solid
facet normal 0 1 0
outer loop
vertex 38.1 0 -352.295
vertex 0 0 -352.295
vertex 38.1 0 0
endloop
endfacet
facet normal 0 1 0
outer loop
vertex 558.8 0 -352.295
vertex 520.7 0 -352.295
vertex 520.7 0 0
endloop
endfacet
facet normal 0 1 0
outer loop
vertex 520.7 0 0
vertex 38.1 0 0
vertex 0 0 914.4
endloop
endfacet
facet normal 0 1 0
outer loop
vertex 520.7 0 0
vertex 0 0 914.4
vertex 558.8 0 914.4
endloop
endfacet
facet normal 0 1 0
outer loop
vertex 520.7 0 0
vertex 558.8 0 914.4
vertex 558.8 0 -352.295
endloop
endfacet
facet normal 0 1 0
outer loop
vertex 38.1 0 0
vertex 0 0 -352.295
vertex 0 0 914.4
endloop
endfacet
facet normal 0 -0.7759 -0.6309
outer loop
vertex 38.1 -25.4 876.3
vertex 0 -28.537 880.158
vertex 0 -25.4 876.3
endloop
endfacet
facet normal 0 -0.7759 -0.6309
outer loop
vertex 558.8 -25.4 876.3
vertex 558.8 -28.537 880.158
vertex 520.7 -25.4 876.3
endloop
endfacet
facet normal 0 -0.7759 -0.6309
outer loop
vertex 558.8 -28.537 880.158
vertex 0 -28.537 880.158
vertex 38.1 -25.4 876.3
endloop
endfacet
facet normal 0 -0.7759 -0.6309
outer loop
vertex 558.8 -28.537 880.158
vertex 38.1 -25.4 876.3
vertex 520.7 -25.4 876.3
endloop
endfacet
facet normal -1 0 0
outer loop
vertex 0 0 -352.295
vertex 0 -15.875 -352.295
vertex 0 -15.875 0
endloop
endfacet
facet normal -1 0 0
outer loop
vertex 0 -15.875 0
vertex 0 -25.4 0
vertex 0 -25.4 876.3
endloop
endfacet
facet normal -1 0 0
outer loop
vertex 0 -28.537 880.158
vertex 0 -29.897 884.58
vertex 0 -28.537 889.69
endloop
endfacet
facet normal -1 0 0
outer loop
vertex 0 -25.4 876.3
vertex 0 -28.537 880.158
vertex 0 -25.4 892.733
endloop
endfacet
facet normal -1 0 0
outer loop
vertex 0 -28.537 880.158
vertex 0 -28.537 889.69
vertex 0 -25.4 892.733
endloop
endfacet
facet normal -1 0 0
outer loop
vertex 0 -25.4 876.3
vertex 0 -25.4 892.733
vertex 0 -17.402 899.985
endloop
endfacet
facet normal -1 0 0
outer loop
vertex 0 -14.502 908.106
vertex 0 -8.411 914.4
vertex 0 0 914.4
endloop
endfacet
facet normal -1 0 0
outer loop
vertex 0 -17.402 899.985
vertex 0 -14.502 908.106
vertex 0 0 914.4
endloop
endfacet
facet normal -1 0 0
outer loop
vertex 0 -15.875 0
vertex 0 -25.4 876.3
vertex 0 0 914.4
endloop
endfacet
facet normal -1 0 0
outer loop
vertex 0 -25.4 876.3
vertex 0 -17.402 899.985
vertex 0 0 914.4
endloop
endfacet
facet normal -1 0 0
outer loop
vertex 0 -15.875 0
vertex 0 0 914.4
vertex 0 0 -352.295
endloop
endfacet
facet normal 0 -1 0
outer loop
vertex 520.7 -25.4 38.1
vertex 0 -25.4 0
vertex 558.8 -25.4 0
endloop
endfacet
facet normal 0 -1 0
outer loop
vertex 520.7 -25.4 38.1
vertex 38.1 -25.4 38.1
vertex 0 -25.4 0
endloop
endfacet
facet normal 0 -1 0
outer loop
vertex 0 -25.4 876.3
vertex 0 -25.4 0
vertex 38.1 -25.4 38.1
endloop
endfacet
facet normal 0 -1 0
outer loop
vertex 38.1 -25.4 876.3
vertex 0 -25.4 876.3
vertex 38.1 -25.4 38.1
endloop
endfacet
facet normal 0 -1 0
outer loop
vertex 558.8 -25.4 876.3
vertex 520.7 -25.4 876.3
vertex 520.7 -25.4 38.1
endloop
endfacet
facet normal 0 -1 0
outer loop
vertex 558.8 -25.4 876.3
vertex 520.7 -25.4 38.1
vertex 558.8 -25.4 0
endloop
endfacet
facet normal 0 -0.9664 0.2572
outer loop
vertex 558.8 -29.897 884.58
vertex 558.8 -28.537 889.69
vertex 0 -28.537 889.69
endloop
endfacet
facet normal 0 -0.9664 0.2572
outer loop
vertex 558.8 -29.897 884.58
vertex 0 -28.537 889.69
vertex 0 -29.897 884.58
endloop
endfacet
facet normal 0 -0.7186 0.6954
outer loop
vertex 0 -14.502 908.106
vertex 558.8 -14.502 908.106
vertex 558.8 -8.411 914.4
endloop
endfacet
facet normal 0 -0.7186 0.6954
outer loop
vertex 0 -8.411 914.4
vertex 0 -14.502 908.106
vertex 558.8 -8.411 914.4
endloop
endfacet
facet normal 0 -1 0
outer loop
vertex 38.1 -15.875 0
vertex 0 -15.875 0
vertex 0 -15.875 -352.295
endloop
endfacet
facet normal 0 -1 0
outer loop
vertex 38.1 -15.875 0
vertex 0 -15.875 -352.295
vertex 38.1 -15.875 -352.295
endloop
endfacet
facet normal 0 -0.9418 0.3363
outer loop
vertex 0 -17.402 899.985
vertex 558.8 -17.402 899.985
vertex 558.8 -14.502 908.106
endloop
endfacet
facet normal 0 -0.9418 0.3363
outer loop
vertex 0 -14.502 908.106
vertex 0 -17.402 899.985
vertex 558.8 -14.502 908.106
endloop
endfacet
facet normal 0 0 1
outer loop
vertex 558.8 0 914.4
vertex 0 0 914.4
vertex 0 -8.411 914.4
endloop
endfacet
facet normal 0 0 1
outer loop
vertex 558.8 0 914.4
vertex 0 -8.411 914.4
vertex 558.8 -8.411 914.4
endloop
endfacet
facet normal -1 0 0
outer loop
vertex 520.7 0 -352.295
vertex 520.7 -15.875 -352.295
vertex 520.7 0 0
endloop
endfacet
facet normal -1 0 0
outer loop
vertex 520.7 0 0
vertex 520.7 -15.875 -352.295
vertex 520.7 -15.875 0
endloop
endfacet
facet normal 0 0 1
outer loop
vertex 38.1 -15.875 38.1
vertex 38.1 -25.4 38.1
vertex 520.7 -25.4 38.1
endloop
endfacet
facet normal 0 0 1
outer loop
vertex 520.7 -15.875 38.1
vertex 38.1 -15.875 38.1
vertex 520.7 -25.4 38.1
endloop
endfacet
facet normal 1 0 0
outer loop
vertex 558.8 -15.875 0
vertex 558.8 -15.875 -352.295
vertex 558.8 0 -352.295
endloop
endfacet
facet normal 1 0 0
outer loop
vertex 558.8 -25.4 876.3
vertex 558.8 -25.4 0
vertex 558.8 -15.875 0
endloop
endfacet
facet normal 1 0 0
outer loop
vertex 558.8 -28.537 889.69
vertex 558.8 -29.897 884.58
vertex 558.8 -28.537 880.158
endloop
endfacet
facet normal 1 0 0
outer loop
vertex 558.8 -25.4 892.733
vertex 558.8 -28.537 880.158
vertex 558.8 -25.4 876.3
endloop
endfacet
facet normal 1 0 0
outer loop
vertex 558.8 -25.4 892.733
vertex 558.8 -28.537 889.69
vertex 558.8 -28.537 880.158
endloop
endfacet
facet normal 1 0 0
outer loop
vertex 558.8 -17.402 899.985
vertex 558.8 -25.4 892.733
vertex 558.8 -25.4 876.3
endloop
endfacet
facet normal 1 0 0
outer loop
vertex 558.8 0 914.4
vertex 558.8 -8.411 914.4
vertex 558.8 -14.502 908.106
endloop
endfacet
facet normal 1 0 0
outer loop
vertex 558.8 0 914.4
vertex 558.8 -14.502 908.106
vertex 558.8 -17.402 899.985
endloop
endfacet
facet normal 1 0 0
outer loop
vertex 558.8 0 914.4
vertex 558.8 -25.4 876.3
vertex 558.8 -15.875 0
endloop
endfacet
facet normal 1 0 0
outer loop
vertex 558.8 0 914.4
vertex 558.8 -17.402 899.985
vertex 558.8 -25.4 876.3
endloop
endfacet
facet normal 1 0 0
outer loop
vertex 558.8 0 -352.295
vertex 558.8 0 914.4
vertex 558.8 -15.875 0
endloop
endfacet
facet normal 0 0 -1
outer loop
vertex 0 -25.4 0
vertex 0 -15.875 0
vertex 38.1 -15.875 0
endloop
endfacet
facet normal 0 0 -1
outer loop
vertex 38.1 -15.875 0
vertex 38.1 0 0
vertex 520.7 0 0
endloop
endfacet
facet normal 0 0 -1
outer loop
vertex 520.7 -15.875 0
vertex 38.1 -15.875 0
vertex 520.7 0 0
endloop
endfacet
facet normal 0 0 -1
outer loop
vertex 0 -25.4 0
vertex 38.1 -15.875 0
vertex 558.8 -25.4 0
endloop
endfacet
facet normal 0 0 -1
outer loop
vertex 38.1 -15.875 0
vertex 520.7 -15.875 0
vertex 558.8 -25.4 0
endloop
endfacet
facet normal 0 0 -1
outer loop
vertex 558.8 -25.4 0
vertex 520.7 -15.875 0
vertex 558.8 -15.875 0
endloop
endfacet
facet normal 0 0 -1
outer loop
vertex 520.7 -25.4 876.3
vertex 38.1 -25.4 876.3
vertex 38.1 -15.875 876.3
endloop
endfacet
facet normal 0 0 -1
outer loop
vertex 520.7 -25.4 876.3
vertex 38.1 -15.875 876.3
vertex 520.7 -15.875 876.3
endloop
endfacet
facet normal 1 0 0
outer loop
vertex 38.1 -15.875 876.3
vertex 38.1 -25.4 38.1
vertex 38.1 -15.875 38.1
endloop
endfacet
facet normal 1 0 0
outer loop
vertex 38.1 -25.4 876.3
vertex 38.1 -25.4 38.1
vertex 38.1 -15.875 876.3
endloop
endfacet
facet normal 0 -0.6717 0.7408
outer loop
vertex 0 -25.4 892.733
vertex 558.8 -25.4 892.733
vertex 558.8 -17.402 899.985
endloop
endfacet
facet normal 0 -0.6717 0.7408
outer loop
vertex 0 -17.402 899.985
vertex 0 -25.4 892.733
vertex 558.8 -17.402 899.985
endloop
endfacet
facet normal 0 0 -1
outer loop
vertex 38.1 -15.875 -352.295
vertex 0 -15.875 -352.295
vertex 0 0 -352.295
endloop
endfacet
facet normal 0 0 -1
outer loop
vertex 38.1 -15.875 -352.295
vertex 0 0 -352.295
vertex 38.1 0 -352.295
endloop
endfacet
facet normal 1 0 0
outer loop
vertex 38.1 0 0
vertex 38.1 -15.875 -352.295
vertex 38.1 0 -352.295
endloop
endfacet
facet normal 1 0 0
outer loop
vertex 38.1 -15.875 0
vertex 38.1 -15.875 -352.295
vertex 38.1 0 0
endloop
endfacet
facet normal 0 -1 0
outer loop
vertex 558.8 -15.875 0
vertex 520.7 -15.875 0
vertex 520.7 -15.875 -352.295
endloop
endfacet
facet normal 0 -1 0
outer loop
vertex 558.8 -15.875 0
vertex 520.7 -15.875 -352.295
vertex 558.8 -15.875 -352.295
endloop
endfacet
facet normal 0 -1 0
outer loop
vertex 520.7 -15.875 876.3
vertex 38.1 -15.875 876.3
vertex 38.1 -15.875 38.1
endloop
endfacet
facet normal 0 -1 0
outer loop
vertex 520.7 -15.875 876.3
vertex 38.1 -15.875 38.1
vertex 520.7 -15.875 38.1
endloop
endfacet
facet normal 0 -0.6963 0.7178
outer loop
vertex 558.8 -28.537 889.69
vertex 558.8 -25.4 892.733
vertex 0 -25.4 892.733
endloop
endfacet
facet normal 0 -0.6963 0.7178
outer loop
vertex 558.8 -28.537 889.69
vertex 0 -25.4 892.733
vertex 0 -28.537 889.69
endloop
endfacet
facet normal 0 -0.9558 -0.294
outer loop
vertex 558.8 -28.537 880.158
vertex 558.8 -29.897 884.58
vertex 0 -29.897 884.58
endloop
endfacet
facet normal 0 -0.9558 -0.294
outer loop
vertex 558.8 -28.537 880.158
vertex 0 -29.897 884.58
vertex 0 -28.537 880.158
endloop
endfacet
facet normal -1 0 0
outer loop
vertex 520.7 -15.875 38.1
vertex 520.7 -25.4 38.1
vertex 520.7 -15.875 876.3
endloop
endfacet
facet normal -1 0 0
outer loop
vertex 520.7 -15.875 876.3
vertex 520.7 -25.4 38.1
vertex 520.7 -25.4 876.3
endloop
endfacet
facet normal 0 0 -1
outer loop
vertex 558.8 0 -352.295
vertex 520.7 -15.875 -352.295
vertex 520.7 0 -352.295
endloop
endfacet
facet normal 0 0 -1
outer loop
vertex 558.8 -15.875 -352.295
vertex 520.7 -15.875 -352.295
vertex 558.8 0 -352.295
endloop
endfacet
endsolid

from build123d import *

# Parameters (mm, degrees)
F0_W     = 558.8
F0_H     = 914.4
F1_DEPTH = 25.4
F2_W     = 482.6
F2_H     = 838.2
F3_DEPTH = 9.525
F4_W     = 38.1
F4_H     = 390.394981
F5_DEPTH = 15.875
F7_DEPTH = 558.801
F9_DEPTH = 558.8


with BuildPart() as f1:
    # F0 (on Front) → F1 (new body)
    with BuildSketch(Plane.XZ):
        with Locations((279.4, 457.2)):
            Rectangle(F0_W, F0_H)
    extrude(amount=F1_DEPTH)

    # F2 (on face) → F3 (cut)
    with BuildSketch(Plane.XZ.offset(25.4)):
        with Locations((279.4, 457.2)):
            Rectangle(F2_W, F2_H)
    extrude(amount=-F3_DEPTH, mode=Mode.SUBTRACT)

    # F4 (on face) → F5 (join, through all)
    with BuildSketch(Plane.XZ.offset(15.875)):
        with Locations((19.05, -157.09749)):
            Rectangle(F4_W, F4_H)
        with Locations((539.75, -157.09749)):
            Rectangle(F4_W, F4_H)
    extrude(amount=-F5_DEPTH)

    # F6 (on face) → F7 (cut, through all)
    with BuildSketch(Plane.YZ.offset(558.8)):
        Polygon((-14.501915, 908.10591), (-8.410952, 914.4), (-25.4, 914.4), (-25.4, 892.733455), (-17.402377, 899.984598), align=None)
    extrude(amount=-F7_DEPTH, mode=Mode.SUBTRACT)

    # F8 (on face) → F9 (join, through all)
    with BuildSketch(Plane.YZ.offset(558.8)):
        Polygon((-25.4, 876.3), (-25.4, 892.733455), (-28.536921, 889.689863), (-29.897201, 884.579603), (-28.536921, 880.158018), align=None)
    extrude(amount=-F9_DEPTH)


solid = f1.part
